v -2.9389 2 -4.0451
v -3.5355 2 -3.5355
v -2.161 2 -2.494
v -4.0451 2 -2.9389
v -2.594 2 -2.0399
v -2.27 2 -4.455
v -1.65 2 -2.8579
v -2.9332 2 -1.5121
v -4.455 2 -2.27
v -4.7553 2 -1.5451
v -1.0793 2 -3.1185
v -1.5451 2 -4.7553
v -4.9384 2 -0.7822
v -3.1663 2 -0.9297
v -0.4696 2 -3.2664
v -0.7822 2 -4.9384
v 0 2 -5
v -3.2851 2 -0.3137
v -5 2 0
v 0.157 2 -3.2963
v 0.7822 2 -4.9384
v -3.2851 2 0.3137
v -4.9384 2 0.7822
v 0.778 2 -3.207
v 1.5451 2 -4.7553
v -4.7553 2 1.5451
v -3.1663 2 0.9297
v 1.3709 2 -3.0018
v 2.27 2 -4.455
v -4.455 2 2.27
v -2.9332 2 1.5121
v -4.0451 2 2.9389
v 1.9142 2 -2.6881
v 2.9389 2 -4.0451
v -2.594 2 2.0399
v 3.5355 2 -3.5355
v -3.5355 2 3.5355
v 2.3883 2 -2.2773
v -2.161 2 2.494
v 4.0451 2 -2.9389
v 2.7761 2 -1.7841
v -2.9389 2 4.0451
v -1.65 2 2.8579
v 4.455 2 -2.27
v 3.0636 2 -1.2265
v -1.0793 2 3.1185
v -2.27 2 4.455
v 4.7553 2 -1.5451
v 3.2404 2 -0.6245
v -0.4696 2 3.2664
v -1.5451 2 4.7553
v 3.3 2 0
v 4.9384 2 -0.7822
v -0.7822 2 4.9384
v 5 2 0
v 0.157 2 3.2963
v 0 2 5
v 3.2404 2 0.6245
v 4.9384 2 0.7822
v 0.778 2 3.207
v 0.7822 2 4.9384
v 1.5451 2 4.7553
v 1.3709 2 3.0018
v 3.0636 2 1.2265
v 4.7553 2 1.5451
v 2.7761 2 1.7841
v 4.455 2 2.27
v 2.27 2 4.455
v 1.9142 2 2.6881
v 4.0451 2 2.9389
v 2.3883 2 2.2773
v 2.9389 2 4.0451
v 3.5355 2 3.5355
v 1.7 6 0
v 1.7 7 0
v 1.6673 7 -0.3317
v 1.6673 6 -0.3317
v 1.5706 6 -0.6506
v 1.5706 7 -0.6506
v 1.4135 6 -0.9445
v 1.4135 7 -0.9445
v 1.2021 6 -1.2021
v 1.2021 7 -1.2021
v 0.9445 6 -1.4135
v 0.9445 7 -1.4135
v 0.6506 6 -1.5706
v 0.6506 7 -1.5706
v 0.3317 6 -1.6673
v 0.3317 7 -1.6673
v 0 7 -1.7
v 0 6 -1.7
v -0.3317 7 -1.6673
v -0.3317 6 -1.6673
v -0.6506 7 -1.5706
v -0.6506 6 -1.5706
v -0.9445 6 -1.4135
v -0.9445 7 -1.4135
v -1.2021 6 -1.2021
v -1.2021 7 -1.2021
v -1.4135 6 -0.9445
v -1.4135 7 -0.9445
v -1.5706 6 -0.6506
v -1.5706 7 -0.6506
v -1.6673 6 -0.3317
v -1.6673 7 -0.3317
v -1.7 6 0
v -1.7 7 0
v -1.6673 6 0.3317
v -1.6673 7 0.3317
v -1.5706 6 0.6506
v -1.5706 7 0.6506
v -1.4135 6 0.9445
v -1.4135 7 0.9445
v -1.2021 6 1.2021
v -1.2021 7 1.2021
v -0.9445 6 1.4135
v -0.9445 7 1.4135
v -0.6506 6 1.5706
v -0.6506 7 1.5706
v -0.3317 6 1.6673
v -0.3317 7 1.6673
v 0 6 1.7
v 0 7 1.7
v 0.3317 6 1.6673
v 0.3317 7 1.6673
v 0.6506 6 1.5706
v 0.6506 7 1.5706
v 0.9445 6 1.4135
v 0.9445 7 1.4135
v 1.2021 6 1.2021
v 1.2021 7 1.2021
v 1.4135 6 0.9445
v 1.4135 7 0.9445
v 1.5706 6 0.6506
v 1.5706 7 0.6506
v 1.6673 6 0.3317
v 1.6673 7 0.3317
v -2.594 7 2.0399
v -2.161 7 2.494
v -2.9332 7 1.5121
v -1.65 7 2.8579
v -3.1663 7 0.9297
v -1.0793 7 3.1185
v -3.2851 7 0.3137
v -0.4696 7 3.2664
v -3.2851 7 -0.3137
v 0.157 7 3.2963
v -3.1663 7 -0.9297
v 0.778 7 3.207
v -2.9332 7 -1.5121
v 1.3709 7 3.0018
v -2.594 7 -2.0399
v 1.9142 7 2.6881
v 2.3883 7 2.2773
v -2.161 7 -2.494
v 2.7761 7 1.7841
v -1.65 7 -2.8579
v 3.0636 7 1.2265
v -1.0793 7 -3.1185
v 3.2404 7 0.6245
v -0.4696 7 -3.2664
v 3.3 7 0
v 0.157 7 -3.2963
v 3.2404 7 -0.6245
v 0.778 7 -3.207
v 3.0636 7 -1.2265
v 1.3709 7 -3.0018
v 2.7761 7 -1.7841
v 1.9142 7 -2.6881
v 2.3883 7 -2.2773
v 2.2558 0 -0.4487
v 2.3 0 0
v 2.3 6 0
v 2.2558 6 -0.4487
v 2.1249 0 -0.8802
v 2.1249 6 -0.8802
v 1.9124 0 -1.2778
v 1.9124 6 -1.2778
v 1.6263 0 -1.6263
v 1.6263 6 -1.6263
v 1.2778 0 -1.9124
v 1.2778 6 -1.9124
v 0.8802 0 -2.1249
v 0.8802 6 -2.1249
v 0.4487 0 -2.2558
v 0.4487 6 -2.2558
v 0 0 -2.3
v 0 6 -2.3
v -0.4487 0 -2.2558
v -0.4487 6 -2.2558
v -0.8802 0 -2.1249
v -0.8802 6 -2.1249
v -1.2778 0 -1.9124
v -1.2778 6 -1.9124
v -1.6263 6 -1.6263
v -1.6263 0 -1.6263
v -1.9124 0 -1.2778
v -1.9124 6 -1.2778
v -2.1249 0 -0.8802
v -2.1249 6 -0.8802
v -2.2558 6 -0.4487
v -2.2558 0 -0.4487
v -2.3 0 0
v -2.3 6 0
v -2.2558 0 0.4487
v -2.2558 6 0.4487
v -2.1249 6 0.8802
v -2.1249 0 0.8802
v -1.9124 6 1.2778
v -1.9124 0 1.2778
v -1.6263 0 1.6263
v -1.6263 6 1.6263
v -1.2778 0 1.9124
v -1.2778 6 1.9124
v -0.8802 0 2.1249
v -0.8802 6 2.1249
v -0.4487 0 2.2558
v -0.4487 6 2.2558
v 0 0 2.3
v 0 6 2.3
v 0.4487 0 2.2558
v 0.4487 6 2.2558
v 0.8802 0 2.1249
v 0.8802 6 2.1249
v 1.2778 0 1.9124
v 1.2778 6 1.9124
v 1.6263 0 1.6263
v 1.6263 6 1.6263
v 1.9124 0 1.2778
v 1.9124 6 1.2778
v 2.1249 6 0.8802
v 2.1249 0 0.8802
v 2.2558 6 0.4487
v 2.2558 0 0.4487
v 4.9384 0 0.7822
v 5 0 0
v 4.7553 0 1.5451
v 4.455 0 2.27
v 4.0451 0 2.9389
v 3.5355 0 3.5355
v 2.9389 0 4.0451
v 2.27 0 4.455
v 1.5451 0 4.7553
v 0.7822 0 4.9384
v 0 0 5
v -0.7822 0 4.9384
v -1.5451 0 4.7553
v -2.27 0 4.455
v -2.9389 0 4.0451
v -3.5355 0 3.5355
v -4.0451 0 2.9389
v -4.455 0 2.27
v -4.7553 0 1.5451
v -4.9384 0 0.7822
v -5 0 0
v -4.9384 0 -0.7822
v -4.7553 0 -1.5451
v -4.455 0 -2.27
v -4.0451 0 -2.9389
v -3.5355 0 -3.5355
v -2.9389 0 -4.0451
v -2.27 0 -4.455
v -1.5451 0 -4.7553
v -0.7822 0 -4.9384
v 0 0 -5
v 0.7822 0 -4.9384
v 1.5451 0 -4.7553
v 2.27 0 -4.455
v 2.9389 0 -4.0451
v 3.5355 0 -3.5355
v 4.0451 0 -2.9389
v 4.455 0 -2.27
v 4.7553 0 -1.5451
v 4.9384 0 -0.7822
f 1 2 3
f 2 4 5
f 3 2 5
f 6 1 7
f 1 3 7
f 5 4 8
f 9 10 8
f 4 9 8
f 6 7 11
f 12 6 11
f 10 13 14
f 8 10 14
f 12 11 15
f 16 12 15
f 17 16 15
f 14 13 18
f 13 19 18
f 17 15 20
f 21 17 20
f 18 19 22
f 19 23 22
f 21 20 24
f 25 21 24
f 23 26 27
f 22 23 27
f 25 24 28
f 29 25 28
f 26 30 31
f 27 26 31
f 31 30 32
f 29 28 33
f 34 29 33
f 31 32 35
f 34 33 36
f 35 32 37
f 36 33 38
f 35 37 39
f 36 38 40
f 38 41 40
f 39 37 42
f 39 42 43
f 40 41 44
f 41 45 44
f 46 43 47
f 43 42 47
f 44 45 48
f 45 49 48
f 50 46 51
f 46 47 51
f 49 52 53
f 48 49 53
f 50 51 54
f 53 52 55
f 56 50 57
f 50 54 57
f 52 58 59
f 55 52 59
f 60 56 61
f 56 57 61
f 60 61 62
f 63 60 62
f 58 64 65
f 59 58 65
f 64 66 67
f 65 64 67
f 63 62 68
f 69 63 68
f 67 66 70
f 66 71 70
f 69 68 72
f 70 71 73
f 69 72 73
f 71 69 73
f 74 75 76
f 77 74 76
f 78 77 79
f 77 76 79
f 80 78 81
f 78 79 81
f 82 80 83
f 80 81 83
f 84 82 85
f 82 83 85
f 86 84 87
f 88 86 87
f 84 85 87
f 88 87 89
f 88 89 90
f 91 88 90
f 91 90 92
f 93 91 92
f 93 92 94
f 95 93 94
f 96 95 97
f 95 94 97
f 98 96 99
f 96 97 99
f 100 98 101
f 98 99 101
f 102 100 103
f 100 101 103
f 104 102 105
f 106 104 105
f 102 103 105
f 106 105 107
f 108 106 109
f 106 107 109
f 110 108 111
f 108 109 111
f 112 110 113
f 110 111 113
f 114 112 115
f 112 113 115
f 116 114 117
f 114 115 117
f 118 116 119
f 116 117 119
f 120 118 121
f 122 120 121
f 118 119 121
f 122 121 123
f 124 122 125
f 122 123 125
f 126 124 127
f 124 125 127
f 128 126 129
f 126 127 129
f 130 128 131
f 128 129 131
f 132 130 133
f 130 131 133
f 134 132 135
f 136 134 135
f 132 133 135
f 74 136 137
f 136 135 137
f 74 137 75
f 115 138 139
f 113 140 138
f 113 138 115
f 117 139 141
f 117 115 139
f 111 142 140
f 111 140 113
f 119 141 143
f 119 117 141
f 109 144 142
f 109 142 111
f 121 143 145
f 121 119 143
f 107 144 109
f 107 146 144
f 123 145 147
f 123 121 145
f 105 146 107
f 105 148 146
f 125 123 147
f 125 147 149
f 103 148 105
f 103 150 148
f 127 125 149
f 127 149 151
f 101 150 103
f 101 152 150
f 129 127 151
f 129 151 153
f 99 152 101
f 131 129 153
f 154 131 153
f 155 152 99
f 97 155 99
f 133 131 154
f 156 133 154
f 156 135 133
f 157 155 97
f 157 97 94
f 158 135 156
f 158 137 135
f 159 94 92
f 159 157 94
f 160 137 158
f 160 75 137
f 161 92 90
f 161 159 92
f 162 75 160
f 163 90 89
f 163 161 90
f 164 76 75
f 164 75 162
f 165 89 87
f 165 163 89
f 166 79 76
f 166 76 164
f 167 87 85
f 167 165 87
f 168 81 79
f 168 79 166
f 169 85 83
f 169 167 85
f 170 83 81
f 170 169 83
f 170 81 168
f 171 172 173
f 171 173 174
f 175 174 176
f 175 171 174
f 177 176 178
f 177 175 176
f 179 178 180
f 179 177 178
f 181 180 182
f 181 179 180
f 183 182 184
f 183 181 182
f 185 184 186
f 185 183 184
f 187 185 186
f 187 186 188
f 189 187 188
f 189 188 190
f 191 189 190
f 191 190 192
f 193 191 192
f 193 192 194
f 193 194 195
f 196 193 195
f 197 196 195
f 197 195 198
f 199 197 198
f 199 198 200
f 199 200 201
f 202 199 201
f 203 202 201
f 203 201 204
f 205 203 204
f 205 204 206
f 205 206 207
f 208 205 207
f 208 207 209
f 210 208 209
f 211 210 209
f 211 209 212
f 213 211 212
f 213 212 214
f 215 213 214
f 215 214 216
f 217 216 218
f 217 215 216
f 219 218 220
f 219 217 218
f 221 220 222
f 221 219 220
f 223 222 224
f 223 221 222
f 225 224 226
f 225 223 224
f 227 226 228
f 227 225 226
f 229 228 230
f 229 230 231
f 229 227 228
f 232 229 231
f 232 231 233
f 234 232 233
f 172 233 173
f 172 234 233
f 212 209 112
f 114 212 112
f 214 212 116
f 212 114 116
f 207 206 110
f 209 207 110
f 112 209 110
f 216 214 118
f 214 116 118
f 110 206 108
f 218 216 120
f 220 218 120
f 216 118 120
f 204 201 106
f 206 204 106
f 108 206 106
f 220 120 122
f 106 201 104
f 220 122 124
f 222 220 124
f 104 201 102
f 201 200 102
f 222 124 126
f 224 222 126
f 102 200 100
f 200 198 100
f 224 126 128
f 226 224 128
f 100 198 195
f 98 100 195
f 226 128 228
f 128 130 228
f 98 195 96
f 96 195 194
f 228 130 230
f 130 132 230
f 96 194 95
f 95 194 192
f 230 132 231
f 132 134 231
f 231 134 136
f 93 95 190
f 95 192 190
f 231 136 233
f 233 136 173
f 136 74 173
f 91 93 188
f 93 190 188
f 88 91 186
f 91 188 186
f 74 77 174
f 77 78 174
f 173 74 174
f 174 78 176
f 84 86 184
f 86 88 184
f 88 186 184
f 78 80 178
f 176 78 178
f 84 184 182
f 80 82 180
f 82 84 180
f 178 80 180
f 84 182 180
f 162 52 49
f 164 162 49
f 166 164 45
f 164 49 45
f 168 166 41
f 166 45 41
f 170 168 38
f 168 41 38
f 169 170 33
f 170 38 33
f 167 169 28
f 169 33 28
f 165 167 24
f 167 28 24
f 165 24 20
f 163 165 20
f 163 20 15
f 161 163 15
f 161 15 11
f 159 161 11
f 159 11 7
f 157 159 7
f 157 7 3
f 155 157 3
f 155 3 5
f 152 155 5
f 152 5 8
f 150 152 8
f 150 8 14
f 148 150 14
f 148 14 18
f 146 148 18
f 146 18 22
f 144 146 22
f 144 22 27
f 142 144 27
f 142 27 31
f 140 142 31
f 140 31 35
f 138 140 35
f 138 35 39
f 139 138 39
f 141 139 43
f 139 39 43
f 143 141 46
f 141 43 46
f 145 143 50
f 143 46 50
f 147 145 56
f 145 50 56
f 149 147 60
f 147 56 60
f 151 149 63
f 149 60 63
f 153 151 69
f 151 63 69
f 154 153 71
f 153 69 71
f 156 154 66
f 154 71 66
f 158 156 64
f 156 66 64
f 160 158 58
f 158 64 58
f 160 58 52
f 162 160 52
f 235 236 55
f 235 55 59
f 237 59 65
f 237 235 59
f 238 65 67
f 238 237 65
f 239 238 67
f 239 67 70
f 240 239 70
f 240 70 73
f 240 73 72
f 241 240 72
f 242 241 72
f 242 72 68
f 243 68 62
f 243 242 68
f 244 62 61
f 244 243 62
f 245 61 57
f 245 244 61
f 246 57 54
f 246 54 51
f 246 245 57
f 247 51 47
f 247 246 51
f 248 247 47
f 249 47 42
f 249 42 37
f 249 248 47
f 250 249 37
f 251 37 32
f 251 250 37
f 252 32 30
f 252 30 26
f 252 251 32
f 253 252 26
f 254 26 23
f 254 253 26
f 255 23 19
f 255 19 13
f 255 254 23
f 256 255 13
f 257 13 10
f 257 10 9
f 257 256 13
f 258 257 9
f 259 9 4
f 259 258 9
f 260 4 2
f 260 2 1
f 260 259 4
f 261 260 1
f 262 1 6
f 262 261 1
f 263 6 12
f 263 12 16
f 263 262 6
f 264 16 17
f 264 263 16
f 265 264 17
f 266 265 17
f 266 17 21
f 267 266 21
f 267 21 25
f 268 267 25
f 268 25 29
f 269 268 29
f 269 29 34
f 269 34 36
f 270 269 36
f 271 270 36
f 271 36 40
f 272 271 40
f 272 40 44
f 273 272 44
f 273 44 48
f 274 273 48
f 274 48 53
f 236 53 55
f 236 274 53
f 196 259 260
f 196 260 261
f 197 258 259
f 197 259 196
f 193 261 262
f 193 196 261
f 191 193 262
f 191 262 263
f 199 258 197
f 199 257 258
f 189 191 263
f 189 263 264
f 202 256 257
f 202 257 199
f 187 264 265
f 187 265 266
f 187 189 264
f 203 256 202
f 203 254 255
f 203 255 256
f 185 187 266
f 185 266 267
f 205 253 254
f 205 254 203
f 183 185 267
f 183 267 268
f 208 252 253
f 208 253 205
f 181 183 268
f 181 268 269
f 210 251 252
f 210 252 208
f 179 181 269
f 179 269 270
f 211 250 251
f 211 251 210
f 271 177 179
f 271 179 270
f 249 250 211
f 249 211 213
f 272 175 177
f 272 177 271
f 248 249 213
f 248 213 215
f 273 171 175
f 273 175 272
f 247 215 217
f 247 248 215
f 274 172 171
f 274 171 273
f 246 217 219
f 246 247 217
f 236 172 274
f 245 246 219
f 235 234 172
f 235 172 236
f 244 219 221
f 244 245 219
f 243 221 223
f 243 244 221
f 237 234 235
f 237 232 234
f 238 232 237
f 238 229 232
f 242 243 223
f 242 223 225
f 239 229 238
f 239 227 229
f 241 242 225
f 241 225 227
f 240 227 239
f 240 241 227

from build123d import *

# Parameters (mm, degrees)
SKETCH3_R           = 3.3
SKETCH3_R_2         = 2.3
BOSS_EXTRUDE3_DEPTH = 7
SKETCH4_R           = 5
SKETCH4_R_2         = 3.3
BOSS_EXTRUDE4_DEPTH = 2
SKETCH5_R           = 2.3
SKETCH5_R_2         = 1.7
BOSS_EXTRUDE5_DEPTH = 1


with BuildPart() as part:
    # Sketch3 → Boss-Extrude3 (new body)
    with BuildSketch(Plane(origin=(0, 0, 0), x_dir=(1, 0, 0), z_dir=(0, 1, 0))):
        Circle(SKETCH3_R)
        Circle(SKETCH3_R_2, mode=Mode.SUBTRACT)
    extrude(amount=BOSS_EXTRUDE3_DEPTH)

    # Sketch4 → Boss-Extrude4 (add)
    with BuildSketch(Plane.XZ):
        Circle(SKETCH4_R)
        Circle(SKETCH4_R_2, mode=Mode.SUBTRACT)
    extrude(amount=-BOSS_EXTRUDE4_DEPTH)

    # Sketch5 → Boss-Extrude5 (add)
    with BuildSketch(Plane(origin=(0, 7, 0), x_dir=(1, 0, 0), z_dir=(0, 1, 0))):
        Circle(SKETCH5_R)
        Circle(SKETCH5_R_2, mode=Mode.SUBTRACT)
    extrude(amount=-BOSS_EXTRUDE5_DEPTH)


solid = part.part
